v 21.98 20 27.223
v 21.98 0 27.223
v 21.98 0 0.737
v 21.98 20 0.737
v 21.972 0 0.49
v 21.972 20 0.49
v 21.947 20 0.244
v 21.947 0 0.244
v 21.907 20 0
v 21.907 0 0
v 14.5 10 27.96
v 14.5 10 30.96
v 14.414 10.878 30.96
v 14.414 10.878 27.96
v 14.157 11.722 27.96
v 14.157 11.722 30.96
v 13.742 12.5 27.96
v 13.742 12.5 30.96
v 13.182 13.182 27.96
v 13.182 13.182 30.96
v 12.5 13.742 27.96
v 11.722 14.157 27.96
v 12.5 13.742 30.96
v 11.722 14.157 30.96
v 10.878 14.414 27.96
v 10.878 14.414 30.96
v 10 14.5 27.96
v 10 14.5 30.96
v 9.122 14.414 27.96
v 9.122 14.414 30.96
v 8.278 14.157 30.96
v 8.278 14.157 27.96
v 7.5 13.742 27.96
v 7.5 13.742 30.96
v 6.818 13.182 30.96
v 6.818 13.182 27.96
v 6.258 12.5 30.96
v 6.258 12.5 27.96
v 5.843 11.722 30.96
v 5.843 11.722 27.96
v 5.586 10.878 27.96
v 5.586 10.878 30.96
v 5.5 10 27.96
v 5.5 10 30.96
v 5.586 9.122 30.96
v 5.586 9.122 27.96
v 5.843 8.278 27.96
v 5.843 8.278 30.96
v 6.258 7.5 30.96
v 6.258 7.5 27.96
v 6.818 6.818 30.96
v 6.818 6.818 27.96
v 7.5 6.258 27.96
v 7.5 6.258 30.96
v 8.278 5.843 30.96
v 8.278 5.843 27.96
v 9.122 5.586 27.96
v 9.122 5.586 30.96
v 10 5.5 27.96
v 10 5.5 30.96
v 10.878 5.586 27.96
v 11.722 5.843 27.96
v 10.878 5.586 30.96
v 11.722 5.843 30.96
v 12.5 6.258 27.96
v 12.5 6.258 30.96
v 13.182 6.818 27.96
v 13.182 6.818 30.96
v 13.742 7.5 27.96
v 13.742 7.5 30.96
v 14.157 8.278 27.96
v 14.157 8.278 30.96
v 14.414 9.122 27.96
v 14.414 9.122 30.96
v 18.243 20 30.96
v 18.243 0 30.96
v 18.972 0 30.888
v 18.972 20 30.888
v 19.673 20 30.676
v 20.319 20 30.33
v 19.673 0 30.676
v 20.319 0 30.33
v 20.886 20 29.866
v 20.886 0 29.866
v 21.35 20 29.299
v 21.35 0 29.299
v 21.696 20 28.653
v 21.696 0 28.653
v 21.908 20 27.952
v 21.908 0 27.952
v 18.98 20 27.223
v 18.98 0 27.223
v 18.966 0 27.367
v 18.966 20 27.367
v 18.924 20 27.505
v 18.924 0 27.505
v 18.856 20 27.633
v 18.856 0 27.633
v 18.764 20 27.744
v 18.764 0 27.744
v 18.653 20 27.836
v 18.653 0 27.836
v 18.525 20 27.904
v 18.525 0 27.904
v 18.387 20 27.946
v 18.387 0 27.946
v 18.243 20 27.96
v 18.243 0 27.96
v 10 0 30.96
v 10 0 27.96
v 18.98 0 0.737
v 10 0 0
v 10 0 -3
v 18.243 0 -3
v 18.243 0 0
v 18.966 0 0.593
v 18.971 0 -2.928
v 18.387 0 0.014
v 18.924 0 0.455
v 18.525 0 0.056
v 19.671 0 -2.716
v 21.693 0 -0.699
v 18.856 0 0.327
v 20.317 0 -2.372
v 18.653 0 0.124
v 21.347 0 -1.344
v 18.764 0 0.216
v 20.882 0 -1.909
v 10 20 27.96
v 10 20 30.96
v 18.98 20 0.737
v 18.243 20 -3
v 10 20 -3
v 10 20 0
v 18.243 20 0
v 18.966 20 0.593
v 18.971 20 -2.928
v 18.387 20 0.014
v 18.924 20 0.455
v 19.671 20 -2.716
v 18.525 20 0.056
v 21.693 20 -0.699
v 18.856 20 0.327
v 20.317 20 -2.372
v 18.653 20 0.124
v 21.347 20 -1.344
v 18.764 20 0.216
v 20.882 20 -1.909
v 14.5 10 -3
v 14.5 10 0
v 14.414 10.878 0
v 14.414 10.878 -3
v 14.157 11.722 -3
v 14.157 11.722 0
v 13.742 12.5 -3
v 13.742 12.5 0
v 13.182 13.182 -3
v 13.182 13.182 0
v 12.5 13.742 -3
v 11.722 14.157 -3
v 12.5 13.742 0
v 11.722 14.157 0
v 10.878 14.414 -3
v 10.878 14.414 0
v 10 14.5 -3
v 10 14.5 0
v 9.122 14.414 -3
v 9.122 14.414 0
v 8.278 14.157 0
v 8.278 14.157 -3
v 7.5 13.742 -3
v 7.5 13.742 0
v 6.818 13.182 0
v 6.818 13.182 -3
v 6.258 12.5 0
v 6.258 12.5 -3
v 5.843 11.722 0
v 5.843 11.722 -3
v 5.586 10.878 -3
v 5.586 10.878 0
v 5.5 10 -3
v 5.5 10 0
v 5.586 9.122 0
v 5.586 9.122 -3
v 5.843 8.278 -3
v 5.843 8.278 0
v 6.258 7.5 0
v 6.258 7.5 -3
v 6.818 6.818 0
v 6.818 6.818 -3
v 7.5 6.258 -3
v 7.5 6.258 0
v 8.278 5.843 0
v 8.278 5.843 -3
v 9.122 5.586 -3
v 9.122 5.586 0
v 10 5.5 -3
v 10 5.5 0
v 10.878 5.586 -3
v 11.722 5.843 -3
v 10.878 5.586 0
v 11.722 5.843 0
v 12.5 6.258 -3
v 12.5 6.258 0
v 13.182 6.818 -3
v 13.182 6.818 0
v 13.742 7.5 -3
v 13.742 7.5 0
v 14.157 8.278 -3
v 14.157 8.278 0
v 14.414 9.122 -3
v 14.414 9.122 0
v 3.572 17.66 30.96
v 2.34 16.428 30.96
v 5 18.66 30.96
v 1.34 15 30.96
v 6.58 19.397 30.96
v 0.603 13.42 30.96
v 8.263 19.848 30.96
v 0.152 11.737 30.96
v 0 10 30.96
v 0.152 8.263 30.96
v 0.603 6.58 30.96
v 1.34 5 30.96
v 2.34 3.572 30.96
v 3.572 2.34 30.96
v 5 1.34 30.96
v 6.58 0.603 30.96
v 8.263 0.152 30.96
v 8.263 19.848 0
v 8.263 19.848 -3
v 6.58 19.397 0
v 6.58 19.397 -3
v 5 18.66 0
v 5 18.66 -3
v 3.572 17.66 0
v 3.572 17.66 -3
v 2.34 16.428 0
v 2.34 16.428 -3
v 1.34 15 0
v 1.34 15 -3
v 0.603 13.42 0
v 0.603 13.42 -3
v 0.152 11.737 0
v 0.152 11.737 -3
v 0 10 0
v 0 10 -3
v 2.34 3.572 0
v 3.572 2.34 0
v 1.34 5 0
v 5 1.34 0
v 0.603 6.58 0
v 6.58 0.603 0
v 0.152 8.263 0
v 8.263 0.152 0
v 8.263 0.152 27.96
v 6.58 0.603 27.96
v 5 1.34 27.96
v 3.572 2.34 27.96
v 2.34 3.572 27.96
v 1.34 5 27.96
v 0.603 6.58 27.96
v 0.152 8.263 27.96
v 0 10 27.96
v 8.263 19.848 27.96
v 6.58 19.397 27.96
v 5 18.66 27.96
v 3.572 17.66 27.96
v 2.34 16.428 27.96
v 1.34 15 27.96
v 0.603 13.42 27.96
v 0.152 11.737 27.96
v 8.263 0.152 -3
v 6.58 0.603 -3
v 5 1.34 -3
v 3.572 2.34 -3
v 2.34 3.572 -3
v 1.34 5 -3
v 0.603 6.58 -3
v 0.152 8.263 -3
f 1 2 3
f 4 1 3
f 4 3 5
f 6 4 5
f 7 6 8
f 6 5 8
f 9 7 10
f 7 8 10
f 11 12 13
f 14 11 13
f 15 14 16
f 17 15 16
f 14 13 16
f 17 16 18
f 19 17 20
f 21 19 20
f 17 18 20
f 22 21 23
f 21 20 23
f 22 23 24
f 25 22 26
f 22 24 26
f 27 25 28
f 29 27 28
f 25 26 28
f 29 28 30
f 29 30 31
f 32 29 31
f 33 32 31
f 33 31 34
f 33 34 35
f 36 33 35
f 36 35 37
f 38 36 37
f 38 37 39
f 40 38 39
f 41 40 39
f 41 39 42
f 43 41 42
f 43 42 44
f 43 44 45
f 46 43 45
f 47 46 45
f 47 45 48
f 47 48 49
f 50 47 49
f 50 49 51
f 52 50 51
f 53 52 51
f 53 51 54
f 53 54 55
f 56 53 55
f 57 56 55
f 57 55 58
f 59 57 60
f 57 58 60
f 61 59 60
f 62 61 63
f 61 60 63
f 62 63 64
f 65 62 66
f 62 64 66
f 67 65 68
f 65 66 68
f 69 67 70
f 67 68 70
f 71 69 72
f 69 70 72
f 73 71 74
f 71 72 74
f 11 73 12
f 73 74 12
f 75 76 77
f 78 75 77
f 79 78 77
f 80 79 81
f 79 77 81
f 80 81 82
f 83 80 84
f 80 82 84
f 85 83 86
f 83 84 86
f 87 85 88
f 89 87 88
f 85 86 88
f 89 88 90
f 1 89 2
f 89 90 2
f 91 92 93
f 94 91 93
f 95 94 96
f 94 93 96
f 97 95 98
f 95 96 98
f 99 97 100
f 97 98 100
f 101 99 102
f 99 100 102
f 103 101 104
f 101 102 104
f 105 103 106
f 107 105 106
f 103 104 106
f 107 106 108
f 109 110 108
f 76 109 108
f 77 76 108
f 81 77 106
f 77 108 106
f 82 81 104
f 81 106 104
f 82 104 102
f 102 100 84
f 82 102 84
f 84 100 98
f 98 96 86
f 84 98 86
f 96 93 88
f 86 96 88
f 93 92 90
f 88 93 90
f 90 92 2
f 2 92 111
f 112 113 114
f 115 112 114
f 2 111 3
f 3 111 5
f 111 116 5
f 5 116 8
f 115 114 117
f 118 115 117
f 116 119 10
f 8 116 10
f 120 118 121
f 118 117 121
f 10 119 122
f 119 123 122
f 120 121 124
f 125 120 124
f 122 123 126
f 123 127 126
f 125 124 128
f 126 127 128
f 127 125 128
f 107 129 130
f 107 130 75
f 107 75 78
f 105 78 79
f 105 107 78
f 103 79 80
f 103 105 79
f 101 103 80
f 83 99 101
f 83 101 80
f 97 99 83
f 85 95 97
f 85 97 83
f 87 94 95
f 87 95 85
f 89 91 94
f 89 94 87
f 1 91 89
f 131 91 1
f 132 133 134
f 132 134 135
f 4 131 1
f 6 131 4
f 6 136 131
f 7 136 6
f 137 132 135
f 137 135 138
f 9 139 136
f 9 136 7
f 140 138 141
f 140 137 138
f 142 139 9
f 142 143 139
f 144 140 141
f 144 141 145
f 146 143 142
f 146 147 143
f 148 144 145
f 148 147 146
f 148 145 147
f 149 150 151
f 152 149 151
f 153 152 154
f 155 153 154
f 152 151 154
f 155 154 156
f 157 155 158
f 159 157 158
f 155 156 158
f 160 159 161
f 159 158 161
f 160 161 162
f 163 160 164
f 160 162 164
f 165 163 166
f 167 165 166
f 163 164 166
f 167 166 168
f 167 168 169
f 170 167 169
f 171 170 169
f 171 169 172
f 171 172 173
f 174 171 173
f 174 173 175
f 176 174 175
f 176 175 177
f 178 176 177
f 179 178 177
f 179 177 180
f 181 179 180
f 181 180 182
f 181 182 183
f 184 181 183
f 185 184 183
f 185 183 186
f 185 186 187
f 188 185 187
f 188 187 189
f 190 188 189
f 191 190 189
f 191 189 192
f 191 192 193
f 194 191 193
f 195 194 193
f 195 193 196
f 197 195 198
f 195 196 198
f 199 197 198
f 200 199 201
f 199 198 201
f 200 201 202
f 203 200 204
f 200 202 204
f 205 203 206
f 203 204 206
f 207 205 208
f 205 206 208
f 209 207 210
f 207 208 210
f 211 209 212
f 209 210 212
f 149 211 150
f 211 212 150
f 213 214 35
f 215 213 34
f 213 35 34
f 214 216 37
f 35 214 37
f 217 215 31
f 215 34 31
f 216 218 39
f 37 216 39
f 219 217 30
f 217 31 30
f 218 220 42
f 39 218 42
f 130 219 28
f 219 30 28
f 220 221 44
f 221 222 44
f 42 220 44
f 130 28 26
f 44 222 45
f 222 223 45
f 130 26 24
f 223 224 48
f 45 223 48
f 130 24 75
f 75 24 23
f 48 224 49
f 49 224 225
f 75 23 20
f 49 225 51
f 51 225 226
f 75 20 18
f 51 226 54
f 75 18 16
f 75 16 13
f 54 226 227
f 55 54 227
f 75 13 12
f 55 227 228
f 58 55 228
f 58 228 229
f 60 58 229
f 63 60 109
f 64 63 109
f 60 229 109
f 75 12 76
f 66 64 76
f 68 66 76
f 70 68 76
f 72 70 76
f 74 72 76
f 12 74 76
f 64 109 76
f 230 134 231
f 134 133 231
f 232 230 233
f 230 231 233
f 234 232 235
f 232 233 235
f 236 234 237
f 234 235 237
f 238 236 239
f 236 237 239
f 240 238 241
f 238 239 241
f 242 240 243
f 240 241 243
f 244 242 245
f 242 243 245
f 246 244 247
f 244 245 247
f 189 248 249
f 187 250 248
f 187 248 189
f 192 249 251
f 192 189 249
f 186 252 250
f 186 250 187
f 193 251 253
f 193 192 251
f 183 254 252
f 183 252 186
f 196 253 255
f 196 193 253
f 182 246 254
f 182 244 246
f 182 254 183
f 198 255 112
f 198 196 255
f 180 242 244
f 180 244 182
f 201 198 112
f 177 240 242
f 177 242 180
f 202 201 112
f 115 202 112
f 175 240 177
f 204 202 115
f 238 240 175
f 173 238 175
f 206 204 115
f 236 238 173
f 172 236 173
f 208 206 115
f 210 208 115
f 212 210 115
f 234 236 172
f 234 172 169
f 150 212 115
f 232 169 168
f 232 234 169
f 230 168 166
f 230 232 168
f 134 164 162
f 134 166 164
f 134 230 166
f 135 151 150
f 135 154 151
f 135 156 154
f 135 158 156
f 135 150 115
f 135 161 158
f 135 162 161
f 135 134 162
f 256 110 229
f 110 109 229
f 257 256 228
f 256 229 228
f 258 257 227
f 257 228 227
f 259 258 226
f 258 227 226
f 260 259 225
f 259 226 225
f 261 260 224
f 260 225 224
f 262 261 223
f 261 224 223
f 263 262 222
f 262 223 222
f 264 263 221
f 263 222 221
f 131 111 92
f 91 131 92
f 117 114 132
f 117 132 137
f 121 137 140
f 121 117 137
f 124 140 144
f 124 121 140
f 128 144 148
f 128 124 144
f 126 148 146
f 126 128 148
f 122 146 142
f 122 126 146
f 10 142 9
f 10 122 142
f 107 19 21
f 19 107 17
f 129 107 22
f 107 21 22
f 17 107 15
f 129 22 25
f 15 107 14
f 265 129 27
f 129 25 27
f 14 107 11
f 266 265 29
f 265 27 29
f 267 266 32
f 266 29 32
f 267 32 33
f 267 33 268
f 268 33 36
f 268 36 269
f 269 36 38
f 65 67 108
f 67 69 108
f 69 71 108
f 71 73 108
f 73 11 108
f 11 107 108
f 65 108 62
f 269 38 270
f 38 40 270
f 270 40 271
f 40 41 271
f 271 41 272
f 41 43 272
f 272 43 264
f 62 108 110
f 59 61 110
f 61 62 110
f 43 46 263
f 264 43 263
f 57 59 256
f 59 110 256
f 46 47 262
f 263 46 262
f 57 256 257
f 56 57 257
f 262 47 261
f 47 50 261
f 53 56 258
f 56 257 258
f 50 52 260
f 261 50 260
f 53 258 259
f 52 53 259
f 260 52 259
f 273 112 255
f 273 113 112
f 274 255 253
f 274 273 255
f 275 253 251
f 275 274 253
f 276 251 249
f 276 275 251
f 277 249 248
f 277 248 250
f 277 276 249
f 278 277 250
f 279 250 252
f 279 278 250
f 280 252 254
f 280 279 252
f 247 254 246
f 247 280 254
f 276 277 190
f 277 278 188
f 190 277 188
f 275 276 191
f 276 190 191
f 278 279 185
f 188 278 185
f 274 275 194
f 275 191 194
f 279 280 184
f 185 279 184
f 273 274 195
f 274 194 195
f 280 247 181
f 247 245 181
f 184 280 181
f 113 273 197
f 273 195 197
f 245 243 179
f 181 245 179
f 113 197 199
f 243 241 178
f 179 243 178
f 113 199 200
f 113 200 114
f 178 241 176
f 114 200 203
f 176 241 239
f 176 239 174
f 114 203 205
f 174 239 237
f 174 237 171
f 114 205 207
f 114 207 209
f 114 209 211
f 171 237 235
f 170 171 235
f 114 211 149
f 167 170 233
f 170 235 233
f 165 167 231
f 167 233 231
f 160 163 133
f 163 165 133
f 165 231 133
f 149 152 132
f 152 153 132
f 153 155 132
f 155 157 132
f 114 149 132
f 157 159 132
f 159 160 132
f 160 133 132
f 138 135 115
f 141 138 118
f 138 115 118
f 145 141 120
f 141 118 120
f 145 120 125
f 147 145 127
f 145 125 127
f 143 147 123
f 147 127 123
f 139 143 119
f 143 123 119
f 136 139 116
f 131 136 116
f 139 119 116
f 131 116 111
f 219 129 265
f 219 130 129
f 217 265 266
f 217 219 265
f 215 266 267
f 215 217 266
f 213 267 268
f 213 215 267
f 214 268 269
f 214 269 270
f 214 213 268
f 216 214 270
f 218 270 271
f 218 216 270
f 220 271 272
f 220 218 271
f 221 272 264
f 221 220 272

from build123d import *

# Parameters (mm, degrees)
SKETCH1_W              = 70
SKETCH1_H              = 20
BASE_FLANGE1_DEPTH     = 3
SKETCHED_BEND1_DEPTH   = 20
SKETCHED_BEND1_2_DEPTH = 20
FILLET1_R              = 10
SKETCH10_R             = 4.5
CUT_EXTRUDE1_DEPTH     = 46.126468159


# Read off the part's stored shape, not the designer's step: Sketched Bend1
# Sheet-metal steps are written as plain solids
with BuildPart() as part:
    # Sketch1 → Base-Flange1 (new body)
    with BuildSketch(Plane.XY):
        with Locations((35, 10)):
            Rectangle(SKETCH1_W, SKETCH1_H)
    extrude(amount=-BASE_FLANGE1_DEPTH)

    # Sketched Bend1 outline → Sketched Bend1 (cut)
    with BuildSketch(Plane(origin=(0, 0, 0), x_dir=(1, 0, 0), z_dir=(0, 1, 0))):
        with BuildLine():
            ThreePointArc((18.243378468, 3), (20.610845469, 2.154295979), (21.906655689, 0))
            Line((21.906655689, 0), (70, 0))
            Line((70, 0), (70, 3))
            Line((70, 3), (18.243378468, 3))
        make_face()
    extrude(amount=SKETCHED_BEND1_DEPTH, mode=Mode.SUBTRACT)

    # Sketched Bend1 2 outline → Sketched Bend1 2 (add)
    with BuildSketch(Plane(origin=(0, 0, 0), x_dir=(1, 0, 0), z_dir=(0, 1, 0))):
        with BuildLine():
            Line((18.979978468, -0.7366), (18.979978468, -27.223356935))
            ThreePointArc((18.979978468, -27.223356935), (18.764233323, -27.74421179), (18.243378468, -27.959956935))
            Line((18.243378468, -27.959956935), (0, -27.959956935))
            Line((0, -27.959956935), (0, -30.959956935))
            Line((0, -30.959956935), (18.243378468, -30.959956935))
            ThreePointArc((18.243378468, -30.959956935), (20.885553666, -29.865532134), (21.979978468, -27.223356935))
            Line((21.979978468, -27.223356935), (21.979978468, -0.7366))
            ThreePointArc((21.979978468, -0.7366), (21.961602589, -0.36647982), (21.906655689, 0))
            Line((21.906655689, 0), (18.243378468, 0))
            ThreePointArc((18.243378468, 0), (18.764233323, -0.215745145), (18.979978468, -0.7366))
        make_face()
    extrude(amount=SKETCHED_BEND1_2_DEPTH)

    # Fillet1
    fillet1_edges = [part.edges().sort_by_distance(p)[0] for p in [
        (0, 0, 29.459956935),
        (0, 0, -1.5),
        (0, 20, 29.459956935),
        (0, 20, -1.5),
    ]]
    fillet(fillet1_edges, radius=FILLET1_R - 0.0001)  # a hair under: the kernel refuses the full size

    # Sketch10 → Cut-Extrude1 (cut, through all)
    with BuildSketch(Plane.XY.offset(30.959956935)):
        with Locations((10, 10)):
            Circle(SKETCH10_R)
    extrude(amount=-CUT_EXTRUDE1_DEPTH, mode=Mode.SUBTRACT)


solid = part.part
